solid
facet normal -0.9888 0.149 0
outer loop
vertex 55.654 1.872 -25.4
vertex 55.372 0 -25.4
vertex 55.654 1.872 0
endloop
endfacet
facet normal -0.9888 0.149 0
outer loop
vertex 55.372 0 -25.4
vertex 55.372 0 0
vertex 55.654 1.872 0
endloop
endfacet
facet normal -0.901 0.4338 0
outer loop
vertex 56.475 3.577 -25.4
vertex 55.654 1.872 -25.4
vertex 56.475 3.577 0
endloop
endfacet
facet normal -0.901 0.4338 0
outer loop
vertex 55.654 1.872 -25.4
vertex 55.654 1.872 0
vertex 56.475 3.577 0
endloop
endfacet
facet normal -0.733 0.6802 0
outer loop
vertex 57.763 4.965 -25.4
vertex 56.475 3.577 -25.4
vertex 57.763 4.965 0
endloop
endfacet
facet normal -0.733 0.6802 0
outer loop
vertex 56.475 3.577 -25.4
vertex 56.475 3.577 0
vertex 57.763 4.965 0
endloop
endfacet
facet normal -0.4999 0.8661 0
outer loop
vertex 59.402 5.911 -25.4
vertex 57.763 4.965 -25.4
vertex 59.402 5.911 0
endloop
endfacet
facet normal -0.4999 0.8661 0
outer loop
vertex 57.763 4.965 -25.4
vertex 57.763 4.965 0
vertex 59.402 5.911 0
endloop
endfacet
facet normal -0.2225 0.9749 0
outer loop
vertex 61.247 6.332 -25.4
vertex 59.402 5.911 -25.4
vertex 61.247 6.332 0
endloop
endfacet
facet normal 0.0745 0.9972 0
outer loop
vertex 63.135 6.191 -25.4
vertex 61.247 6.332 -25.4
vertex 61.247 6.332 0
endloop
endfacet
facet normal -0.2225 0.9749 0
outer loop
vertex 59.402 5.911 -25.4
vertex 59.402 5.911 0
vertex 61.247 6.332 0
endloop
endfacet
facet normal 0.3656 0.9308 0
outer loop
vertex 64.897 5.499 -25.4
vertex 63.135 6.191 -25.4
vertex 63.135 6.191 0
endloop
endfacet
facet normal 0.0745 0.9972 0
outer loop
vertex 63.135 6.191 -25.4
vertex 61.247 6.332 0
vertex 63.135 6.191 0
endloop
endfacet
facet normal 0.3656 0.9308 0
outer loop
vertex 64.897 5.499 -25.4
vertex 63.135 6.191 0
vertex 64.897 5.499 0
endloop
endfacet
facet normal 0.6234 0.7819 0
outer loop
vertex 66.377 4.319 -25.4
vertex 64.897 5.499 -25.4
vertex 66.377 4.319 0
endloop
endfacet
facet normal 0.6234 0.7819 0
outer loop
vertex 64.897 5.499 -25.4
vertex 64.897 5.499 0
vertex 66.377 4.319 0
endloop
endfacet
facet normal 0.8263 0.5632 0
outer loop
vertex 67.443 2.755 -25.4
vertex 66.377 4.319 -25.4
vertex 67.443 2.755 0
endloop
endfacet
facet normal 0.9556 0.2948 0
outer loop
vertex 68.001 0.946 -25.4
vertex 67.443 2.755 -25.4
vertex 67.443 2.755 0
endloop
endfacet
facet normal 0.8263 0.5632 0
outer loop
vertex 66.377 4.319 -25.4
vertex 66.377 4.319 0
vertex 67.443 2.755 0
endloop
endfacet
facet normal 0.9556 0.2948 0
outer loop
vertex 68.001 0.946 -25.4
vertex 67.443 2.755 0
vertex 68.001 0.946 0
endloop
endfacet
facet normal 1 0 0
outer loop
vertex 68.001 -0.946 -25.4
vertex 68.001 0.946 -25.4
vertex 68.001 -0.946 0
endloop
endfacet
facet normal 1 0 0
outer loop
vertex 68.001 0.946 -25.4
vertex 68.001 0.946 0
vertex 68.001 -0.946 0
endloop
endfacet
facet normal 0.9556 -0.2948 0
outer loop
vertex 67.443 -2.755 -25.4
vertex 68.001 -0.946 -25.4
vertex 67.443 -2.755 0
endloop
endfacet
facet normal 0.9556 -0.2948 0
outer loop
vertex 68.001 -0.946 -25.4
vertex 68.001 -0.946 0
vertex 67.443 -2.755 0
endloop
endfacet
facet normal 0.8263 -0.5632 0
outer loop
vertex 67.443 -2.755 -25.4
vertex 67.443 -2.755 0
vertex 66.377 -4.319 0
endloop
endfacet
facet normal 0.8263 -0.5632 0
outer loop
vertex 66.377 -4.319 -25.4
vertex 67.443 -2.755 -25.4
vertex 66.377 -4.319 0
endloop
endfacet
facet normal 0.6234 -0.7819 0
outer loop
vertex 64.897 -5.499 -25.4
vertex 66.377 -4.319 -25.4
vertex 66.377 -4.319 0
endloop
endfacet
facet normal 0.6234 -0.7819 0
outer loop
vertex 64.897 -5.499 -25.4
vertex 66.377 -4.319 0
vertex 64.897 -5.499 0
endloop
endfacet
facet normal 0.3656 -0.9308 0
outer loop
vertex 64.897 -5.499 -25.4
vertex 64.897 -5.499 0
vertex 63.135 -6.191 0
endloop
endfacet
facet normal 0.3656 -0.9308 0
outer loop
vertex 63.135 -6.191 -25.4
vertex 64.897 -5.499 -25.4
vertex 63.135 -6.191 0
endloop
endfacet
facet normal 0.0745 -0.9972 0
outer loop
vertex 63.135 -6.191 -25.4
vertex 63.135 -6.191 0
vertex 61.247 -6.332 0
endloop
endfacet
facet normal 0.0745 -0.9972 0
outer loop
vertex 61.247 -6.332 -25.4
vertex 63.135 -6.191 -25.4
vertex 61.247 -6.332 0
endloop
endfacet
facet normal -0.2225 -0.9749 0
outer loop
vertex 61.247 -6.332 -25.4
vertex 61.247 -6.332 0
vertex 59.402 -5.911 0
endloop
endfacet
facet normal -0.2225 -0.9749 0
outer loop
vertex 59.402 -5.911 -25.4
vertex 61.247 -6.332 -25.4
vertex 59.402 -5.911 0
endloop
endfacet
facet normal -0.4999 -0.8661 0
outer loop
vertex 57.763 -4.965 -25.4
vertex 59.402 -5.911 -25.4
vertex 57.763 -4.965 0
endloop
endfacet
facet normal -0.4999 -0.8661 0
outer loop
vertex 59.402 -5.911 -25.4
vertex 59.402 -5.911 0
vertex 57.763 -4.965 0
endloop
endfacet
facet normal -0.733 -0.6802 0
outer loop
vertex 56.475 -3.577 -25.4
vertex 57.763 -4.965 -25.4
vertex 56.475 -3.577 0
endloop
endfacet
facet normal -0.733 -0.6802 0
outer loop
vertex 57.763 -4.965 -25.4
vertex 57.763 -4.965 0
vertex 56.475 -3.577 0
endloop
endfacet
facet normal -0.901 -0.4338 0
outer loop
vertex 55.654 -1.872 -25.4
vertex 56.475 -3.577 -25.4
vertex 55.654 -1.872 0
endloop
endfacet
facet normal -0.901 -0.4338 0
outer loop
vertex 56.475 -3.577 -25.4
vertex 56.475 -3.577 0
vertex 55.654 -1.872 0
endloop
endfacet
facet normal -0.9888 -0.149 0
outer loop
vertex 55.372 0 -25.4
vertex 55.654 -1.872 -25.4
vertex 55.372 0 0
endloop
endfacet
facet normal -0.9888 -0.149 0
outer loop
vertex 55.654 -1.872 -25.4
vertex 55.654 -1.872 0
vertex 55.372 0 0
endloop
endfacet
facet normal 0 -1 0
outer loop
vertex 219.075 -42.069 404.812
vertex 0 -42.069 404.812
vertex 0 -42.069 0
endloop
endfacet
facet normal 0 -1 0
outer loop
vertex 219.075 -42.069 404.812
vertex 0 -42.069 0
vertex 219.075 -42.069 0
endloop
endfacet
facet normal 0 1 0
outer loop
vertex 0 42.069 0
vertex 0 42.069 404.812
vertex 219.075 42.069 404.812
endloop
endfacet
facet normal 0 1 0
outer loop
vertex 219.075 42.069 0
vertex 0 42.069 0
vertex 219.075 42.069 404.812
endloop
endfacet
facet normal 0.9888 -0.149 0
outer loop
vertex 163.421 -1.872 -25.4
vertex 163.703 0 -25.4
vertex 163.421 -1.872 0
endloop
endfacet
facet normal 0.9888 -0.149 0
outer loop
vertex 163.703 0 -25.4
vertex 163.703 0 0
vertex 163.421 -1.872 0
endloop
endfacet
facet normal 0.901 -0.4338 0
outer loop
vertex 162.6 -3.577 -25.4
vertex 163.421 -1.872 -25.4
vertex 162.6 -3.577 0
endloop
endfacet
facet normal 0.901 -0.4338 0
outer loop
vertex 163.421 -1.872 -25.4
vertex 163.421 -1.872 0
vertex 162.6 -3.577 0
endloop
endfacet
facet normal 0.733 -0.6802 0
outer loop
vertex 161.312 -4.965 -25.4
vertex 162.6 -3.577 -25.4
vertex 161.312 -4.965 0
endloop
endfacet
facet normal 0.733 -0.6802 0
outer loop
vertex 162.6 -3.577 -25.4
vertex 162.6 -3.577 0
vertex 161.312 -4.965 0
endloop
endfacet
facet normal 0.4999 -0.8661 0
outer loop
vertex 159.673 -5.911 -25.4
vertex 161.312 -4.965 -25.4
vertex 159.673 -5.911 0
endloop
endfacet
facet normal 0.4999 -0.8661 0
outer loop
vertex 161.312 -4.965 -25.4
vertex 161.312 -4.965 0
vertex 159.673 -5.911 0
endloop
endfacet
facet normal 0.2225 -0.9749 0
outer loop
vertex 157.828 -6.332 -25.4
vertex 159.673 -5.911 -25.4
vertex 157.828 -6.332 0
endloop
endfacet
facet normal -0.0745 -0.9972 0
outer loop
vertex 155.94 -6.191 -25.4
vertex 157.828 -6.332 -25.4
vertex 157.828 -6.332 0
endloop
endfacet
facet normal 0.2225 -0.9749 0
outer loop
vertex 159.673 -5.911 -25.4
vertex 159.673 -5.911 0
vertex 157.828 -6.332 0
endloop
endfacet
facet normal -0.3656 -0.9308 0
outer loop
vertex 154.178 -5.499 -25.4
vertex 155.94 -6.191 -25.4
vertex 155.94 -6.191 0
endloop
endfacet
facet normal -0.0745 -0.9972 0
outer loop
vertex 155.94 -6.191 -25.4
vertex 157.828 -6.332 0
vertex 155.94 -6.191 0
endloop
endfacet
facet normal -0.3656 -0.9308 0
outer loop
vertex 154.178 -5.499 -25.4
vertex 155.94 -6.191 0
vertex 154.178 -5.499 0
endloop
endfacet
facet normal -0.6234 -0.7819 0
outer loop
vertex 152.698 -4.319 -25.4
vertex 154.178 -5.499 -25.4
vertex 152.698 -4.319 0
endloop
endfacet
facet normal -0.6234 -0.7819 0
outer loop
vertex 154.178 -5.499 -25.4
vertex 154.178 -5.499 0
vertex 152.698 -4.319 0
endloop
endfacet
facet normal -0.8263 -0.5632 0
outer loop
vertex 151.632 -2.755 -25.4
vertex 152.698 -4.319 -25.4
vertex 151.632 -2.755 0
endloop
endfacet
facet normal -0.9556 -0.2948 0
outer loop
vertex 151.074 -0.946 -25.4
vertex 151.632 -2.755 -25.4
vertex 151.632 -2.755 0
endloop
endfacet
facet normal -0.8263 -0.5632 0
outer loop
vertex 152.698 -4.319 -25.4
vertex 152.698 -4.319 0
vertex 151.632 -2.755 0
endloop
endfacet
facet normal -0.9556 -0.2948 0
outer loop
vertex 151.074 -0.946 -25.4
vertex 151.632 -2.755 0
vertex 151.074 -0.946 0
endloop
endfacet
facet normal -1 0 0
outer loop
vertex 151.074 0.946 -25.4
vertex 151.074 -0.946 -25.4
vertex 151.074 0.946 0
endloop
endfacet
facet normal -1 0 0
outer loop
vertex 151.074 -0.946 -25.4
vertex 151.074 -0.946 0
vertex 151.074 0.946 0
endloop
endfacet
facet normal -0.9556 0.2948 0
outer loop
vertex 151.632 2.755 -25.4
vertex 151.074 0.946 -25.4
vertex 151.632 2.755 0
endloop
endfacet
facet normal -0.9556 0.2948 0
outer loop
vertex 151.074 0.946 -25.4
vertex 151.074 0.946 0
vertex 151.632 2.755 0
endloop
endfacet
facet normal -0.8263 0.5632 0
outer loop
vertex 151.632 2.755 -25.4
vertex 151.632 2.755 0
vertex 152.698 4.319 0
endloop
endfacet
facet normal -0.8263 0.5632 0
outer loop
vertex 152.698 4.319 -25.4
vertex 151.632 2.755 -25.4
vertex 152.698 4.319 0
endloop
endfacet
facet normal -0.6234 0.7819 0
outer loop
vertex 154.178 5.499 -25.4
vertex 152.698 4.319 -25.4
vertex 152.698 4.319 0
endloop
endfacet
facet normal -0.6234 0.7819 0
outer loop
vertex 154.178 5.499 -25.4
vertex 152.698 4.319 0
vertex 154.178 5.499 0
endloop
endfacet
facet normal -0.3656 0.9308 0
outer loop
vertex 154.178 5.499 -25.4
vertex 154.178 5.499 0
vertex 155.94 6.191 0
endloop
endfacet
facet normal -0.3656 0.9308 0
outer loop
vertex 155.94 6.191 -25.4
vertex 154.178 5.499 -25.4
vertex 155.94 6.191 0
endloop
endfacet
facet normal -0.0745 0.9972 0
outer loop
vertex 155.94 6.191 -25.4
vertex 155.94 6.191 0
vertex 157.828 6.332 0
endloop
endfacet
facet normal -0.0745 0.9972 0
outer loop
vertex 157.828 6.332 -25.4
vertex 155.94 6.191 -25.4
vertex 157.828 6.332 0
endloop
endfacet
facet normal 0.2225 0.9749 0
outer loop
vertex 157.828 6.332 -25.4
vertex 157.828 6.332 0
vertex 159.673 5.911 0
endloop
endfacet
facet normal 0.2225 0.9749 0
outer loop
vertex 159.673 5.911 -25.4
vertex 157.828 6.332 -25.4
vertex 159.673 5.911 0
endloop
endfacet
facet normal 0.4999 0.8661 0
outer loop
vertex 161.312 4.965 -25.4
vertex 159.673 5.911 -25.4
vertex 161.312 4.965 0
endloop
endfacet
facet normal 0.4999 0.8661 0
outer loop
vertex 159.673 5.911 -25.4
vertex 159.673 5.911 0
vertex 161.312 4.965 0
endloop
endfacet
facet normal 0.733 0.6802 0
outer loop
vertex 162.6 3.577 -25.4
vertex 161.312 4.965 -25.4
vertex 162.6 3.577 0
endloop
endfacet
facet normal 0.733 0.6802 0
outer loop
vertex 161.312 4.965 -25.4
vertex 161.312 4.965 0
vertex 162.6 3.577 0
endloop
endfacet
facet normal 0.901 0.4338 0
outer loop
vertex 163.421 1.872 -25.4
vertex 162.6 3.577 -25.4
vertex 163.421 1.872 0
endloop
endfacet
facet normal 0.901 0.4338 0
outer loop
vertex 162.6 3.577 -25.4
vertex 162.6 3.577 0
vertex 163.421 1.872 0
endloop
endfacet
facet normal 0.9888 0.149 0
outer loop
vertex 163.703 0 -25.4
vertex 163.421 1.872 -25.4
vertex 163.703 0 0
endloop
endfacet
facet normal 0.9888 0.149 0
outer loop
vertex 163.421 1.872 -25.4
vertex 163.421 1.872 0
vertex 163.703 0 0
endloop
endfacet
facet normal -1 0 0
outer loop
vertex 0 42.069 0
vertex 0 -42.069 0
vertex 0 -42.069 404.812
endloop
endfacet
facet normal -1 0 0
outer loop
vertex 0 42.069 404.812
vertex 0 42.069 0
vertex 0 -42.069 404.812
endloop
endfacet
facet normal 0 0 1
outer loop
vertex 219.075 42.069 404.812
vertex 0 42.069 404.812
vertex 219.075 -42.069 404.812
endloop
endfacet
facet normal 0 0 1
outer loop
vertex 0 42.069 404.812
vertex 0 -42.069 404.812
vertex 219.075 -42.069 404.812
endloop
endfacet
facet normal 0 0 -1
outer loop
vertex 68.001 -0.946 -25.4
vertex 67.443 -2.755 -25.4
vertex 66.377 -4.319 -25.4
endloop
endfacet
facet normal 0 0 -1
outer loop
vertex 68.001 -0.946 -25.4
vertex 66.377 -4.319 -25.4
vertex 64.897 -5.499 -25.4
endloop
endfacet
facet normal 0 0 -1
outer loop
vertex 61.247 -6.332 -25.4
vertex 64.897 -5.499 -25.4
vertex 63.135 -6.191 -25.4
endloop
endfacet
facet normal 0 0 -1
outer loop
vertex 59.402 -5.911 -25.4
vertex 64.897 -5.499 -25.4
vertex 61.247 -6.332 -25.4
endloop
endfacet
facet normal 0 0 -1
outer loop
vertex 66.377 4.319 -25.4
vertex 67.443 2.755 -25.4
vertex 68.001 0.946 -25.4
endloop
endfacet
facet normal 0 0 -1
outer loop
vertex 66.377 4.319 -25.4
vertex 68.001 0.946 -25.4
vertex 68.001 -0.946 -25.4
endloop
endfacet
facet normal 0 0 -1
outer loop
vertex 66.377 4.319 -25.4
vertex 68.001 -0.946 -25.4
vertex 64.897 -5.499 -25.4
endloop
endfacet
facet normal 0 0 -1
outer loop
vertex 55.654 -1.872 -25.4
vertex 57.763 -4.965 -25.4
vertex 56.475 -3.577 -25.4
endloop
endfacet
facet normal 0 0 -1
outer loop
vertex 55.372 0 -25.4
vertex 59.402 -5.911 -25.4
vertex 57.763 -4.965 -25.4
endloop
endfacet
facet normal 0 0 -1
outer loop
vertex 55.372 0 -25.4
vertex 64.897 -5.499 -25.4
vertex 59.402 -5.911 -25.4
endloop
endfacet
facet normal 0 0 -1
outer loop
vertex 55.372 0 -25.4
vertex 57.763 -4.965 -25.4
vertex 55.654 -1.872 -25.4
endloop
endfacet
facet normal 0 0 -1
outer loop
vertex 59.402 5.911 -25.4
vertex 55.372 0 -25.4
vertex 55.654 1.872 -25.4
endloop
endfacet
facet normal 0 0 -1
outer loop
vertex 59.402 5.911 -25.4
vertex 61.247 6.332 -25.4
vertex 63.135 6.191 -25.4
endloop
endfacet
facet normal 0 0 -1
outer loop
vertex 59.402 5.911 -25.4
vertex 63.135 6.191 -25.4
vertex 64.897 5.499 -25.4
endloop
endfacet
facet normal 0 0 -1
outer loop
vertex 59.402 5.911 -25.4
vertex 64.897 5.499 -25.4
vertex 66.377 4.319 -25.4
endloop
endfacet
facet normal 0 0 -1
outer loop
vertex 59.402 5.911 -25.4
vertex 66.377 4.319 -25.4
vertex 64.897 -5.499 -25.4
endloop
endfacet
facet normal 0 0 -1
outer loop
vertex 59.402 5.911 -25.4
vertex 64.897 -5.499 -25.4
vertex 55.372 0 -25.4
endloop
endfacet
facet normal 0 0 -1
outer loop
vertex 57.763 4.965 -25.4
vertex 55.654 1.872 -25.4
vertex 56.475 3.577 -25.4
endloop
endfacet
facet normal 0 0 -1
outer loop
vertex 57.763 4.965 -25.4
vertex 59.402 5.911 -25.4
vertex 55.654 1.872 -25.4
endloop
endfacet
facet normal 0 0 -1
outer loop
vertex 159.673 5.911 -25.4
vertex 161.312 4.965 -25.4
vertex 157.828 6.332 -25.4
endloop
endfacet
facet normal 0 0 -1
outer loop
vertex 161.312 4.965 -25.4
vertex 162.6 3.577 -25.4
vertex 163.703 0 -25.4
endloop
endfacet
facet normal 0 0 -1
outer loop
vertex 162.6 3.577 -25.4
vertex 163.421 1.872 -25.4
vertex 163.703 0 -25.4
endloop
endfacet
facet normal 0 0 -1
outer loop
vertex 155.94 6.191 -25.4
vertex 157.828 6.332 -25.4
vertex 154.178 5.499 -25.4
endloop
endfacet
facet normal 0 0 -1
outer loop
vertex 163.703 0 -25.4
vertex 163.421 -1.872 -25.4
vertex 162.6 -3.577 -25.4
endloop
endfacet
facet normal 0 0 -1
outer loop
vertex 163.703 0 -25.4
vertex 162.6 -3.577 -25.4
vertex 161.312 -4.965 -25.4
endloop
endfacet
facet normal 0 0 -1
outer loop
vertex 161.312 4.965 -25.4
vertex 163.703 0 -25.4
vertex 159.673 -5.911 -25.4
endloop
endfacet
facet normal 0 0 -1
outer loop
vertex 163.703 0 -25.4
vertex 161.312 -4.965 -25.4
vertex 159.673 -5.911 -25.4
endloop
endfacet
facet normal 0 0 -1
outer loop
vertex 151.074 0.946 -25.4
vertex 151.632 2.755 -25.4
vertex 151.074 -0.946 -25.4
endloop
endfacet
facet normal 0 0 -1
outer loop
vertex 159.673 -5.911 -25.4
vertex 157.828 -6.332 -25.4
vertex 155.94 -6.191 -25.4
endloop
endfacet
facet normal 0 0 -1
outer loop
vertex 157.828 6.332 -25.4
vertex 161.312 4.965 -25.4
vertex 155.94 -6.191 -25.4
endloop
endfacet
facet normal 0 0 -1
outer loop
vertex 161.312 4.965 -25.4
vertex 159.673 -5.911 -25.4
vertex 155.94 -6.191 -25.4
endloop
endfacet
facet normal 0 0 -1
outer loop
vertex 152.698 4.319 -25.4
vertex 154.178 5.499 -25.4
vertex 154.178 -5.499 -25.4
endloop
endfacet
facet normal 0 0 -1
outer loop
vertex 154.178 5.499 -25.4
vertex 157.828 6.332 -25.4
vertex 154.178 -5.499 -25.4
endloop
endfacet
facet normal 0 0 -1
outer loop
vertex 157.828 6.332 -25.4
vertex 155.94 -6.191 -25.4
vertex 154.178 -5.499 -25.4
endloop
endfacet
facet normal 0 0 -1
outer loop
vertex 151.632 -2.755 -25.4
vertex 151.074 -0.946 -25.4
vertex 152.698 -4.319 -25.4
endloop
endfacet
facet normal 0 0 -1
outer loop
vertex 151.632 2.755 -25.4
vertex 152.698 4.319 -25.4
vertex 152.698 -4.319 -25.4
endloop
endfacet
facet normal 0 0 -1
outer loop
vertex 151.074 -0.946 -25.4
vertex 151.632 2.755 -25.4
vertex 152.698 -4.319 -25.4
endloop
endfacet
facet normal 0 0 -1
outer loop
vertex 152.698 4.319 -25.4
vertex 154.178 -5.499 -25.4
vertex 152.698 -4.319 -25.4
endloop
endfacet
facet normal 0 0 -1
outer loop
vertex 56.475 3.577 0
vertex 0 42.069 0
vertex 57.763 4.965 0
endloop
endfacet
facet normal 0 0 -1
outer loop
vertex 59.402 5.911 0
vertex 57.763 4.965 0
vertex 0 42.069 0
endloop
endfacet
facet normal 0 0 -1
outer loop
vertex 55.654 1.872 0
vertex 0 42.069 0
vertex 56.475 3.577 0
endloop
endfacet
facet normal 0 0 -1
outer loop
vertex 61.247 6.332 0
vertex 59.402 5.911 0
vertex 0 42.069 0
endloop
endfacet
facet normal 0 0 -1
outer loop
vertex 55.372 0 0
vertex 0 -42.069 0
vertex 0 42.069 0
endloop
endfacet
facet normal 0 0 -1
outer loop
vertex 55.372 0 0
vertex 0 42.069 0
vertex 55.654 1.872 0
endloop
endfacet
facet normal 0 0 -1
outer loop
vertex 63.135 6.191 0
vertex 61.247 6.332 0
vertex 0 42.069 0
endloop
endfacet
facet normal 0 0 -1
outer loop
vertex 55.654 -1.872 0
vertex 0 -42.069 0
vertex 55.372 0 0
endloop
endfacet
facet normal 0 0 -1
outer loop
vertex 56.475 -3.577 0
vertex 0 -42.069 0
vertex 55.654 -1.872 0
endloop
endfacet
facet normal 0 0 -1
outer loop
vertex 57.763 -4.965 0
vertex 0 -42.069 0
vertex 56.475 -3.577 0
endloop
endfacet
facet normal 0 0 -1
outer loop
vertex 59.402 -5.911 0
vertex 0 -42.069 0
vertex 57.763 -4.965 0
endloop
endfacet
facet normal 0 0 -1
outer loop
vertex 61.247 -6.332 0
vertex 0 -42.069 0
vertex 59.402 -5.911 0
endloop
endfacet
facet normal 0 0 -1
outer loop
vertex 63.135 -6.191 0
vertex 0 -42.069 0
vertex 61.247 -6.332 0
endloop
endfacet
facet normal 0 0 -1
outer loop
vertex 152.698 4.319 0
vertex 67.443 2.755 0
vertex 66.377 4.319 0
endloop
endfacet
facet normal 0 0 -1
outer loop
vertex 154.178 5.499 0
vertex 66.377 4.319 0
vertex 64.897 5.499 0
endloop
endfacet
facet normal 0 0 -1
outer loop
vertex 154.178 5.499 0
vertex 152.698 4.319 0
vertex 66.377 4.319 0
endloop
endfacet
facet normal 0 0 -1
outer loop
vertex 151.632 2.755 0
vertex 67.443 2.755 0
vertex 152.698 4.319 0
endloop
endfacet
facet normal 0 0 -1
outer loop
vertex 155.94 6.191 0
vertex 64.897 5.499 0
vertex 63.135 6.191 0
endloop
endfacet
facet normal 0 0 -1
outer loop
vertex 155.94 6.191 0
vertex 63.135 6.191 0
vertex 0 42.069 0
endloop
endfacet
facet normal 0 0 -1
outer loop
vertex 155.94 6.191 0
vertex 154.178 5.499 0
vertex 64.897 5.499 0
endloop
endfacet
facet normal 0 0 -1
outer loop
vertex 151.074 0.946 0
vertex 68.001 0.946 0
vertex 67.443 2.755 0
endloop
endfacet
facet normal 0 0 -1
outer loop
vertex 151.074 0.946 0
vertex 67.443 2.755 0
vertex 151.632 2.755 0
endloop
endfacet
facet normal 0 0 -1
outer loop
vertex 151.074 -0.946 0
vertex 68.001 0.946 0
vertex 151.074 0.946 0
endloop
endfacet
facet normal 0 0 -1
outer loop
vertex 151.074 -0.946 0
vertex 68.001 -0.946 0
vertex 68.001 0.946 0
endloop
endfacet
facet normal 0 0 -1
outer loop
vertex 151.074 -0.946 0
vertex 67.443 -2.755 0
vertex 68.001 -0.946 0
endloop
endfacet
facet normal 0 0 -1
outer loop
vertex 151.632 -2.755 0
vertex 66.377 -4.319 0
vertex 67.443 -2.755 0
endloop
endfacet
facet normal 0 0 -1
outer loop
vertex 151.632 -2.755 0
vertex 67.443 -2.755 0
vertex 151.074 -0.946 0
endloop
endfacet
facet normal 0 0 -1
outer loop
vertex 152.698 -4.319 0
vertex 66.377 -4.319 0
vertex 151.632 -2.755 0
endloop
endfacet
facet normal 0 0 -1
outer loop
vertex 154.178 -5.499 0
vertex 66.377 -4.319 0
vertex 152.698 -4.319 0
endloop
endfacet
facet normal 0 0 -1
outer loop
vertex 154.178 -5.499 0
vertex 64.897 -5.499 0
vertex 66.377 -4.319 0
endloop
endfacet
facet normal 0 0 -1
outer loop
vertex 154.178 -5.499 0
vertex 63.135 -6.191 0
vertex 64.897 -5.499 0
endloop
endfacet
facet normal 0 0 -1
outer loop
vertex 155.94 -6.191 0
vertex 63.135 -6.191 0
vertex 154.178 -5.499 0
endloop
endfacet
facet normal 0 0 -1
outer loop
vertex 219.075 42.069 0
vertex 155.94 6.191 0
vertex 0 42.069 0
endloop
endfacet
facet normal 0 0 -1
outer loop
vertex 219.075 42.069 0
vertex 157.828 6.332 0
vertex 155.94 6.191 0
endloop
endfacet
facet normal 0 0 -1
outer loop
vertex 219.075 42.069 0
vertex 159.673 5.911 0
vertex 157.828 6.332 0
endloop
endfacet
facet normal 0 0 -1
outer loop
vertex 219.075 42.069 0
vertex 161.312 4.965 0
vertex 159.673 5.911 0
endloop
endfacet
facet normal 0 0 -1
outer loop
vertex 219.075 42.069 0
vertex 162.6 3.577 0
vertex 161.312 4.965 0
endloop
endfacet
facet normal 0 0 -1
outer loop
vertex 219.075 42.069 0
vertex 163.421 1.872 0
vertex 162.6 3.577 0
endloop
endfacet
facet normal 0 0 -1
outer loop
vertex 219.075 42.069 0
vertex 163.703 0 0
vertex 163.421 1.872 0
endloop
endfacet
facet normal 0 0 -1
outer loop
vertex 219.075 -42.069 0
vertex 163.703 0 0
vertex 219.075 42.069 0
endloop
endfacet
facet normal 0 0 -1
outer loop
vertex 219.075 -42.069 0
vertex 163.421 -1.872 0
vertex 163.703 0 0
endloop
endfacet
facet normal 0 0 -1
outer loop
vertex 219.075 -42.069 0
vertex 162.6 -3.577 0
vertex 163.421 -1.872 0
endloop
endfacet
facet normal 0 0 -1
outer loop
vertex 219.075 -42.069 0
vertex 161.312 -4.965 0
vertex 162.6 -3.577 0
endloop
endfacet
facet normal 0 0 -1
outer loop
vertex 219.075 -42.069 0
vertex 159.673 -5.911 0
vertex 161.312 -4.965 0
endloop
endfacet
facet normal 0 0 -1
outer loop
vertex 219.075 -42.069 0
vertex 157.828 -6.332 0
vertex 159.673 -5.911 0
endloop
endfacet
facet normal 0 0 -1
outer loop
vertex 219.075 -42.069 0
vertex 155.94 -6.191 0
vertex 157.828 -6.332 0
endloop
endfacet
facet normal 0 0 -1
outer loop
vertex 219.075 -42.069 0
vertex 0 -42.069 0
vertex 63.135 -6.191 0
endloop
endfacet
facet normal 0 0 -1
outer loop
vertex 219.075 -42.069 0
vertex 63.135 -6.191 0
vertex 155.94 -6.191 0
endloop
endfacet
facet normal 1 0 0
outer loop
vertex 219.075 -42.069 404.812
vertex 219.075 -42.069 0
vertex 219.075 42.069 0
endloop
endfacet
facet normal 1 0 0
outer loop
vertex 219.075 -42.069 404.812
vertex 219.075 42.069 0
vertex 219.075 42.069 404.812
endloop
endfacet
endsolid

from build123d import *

# Parameters (mm, degrees)
F0_W     = 219.075
F0_H     = 404.8125
F1_DEPTH = 42.06875
F2_W     = 6.35
F2_H     = 25.4


with BuildPart() as f1:
    # F0 (on Front) → F1 (new body, symmetric)
    with BuildSketch(Plane.XZ):
        with Locations((109.5375, 202.40625)):
            Rectangle(F0_W, F0_H)
    extrude(amount=F1_DEPTH, both=True)

    # F2 (on Front) → F3 (revolve)
    with BuildSketch(Plane.XZ):
        with Locations((58.547, -12.7)):
            Rectangle(F2_W, F2_H)
    revolve(axis=Axis((61.722, 0, -40.7141068673), (0, 0, -1)))

    # F2 (on Front) → F4 (revolve)
    with BuildSketch(Plane.XZ):
        with Locations((160.528, -12.7)):
            Rectangle(F2_W, F2_H)
    revolve(axis=Axis((157.353, 0, -46.729570285), (0, 0, -1)))


solid = f1.part
